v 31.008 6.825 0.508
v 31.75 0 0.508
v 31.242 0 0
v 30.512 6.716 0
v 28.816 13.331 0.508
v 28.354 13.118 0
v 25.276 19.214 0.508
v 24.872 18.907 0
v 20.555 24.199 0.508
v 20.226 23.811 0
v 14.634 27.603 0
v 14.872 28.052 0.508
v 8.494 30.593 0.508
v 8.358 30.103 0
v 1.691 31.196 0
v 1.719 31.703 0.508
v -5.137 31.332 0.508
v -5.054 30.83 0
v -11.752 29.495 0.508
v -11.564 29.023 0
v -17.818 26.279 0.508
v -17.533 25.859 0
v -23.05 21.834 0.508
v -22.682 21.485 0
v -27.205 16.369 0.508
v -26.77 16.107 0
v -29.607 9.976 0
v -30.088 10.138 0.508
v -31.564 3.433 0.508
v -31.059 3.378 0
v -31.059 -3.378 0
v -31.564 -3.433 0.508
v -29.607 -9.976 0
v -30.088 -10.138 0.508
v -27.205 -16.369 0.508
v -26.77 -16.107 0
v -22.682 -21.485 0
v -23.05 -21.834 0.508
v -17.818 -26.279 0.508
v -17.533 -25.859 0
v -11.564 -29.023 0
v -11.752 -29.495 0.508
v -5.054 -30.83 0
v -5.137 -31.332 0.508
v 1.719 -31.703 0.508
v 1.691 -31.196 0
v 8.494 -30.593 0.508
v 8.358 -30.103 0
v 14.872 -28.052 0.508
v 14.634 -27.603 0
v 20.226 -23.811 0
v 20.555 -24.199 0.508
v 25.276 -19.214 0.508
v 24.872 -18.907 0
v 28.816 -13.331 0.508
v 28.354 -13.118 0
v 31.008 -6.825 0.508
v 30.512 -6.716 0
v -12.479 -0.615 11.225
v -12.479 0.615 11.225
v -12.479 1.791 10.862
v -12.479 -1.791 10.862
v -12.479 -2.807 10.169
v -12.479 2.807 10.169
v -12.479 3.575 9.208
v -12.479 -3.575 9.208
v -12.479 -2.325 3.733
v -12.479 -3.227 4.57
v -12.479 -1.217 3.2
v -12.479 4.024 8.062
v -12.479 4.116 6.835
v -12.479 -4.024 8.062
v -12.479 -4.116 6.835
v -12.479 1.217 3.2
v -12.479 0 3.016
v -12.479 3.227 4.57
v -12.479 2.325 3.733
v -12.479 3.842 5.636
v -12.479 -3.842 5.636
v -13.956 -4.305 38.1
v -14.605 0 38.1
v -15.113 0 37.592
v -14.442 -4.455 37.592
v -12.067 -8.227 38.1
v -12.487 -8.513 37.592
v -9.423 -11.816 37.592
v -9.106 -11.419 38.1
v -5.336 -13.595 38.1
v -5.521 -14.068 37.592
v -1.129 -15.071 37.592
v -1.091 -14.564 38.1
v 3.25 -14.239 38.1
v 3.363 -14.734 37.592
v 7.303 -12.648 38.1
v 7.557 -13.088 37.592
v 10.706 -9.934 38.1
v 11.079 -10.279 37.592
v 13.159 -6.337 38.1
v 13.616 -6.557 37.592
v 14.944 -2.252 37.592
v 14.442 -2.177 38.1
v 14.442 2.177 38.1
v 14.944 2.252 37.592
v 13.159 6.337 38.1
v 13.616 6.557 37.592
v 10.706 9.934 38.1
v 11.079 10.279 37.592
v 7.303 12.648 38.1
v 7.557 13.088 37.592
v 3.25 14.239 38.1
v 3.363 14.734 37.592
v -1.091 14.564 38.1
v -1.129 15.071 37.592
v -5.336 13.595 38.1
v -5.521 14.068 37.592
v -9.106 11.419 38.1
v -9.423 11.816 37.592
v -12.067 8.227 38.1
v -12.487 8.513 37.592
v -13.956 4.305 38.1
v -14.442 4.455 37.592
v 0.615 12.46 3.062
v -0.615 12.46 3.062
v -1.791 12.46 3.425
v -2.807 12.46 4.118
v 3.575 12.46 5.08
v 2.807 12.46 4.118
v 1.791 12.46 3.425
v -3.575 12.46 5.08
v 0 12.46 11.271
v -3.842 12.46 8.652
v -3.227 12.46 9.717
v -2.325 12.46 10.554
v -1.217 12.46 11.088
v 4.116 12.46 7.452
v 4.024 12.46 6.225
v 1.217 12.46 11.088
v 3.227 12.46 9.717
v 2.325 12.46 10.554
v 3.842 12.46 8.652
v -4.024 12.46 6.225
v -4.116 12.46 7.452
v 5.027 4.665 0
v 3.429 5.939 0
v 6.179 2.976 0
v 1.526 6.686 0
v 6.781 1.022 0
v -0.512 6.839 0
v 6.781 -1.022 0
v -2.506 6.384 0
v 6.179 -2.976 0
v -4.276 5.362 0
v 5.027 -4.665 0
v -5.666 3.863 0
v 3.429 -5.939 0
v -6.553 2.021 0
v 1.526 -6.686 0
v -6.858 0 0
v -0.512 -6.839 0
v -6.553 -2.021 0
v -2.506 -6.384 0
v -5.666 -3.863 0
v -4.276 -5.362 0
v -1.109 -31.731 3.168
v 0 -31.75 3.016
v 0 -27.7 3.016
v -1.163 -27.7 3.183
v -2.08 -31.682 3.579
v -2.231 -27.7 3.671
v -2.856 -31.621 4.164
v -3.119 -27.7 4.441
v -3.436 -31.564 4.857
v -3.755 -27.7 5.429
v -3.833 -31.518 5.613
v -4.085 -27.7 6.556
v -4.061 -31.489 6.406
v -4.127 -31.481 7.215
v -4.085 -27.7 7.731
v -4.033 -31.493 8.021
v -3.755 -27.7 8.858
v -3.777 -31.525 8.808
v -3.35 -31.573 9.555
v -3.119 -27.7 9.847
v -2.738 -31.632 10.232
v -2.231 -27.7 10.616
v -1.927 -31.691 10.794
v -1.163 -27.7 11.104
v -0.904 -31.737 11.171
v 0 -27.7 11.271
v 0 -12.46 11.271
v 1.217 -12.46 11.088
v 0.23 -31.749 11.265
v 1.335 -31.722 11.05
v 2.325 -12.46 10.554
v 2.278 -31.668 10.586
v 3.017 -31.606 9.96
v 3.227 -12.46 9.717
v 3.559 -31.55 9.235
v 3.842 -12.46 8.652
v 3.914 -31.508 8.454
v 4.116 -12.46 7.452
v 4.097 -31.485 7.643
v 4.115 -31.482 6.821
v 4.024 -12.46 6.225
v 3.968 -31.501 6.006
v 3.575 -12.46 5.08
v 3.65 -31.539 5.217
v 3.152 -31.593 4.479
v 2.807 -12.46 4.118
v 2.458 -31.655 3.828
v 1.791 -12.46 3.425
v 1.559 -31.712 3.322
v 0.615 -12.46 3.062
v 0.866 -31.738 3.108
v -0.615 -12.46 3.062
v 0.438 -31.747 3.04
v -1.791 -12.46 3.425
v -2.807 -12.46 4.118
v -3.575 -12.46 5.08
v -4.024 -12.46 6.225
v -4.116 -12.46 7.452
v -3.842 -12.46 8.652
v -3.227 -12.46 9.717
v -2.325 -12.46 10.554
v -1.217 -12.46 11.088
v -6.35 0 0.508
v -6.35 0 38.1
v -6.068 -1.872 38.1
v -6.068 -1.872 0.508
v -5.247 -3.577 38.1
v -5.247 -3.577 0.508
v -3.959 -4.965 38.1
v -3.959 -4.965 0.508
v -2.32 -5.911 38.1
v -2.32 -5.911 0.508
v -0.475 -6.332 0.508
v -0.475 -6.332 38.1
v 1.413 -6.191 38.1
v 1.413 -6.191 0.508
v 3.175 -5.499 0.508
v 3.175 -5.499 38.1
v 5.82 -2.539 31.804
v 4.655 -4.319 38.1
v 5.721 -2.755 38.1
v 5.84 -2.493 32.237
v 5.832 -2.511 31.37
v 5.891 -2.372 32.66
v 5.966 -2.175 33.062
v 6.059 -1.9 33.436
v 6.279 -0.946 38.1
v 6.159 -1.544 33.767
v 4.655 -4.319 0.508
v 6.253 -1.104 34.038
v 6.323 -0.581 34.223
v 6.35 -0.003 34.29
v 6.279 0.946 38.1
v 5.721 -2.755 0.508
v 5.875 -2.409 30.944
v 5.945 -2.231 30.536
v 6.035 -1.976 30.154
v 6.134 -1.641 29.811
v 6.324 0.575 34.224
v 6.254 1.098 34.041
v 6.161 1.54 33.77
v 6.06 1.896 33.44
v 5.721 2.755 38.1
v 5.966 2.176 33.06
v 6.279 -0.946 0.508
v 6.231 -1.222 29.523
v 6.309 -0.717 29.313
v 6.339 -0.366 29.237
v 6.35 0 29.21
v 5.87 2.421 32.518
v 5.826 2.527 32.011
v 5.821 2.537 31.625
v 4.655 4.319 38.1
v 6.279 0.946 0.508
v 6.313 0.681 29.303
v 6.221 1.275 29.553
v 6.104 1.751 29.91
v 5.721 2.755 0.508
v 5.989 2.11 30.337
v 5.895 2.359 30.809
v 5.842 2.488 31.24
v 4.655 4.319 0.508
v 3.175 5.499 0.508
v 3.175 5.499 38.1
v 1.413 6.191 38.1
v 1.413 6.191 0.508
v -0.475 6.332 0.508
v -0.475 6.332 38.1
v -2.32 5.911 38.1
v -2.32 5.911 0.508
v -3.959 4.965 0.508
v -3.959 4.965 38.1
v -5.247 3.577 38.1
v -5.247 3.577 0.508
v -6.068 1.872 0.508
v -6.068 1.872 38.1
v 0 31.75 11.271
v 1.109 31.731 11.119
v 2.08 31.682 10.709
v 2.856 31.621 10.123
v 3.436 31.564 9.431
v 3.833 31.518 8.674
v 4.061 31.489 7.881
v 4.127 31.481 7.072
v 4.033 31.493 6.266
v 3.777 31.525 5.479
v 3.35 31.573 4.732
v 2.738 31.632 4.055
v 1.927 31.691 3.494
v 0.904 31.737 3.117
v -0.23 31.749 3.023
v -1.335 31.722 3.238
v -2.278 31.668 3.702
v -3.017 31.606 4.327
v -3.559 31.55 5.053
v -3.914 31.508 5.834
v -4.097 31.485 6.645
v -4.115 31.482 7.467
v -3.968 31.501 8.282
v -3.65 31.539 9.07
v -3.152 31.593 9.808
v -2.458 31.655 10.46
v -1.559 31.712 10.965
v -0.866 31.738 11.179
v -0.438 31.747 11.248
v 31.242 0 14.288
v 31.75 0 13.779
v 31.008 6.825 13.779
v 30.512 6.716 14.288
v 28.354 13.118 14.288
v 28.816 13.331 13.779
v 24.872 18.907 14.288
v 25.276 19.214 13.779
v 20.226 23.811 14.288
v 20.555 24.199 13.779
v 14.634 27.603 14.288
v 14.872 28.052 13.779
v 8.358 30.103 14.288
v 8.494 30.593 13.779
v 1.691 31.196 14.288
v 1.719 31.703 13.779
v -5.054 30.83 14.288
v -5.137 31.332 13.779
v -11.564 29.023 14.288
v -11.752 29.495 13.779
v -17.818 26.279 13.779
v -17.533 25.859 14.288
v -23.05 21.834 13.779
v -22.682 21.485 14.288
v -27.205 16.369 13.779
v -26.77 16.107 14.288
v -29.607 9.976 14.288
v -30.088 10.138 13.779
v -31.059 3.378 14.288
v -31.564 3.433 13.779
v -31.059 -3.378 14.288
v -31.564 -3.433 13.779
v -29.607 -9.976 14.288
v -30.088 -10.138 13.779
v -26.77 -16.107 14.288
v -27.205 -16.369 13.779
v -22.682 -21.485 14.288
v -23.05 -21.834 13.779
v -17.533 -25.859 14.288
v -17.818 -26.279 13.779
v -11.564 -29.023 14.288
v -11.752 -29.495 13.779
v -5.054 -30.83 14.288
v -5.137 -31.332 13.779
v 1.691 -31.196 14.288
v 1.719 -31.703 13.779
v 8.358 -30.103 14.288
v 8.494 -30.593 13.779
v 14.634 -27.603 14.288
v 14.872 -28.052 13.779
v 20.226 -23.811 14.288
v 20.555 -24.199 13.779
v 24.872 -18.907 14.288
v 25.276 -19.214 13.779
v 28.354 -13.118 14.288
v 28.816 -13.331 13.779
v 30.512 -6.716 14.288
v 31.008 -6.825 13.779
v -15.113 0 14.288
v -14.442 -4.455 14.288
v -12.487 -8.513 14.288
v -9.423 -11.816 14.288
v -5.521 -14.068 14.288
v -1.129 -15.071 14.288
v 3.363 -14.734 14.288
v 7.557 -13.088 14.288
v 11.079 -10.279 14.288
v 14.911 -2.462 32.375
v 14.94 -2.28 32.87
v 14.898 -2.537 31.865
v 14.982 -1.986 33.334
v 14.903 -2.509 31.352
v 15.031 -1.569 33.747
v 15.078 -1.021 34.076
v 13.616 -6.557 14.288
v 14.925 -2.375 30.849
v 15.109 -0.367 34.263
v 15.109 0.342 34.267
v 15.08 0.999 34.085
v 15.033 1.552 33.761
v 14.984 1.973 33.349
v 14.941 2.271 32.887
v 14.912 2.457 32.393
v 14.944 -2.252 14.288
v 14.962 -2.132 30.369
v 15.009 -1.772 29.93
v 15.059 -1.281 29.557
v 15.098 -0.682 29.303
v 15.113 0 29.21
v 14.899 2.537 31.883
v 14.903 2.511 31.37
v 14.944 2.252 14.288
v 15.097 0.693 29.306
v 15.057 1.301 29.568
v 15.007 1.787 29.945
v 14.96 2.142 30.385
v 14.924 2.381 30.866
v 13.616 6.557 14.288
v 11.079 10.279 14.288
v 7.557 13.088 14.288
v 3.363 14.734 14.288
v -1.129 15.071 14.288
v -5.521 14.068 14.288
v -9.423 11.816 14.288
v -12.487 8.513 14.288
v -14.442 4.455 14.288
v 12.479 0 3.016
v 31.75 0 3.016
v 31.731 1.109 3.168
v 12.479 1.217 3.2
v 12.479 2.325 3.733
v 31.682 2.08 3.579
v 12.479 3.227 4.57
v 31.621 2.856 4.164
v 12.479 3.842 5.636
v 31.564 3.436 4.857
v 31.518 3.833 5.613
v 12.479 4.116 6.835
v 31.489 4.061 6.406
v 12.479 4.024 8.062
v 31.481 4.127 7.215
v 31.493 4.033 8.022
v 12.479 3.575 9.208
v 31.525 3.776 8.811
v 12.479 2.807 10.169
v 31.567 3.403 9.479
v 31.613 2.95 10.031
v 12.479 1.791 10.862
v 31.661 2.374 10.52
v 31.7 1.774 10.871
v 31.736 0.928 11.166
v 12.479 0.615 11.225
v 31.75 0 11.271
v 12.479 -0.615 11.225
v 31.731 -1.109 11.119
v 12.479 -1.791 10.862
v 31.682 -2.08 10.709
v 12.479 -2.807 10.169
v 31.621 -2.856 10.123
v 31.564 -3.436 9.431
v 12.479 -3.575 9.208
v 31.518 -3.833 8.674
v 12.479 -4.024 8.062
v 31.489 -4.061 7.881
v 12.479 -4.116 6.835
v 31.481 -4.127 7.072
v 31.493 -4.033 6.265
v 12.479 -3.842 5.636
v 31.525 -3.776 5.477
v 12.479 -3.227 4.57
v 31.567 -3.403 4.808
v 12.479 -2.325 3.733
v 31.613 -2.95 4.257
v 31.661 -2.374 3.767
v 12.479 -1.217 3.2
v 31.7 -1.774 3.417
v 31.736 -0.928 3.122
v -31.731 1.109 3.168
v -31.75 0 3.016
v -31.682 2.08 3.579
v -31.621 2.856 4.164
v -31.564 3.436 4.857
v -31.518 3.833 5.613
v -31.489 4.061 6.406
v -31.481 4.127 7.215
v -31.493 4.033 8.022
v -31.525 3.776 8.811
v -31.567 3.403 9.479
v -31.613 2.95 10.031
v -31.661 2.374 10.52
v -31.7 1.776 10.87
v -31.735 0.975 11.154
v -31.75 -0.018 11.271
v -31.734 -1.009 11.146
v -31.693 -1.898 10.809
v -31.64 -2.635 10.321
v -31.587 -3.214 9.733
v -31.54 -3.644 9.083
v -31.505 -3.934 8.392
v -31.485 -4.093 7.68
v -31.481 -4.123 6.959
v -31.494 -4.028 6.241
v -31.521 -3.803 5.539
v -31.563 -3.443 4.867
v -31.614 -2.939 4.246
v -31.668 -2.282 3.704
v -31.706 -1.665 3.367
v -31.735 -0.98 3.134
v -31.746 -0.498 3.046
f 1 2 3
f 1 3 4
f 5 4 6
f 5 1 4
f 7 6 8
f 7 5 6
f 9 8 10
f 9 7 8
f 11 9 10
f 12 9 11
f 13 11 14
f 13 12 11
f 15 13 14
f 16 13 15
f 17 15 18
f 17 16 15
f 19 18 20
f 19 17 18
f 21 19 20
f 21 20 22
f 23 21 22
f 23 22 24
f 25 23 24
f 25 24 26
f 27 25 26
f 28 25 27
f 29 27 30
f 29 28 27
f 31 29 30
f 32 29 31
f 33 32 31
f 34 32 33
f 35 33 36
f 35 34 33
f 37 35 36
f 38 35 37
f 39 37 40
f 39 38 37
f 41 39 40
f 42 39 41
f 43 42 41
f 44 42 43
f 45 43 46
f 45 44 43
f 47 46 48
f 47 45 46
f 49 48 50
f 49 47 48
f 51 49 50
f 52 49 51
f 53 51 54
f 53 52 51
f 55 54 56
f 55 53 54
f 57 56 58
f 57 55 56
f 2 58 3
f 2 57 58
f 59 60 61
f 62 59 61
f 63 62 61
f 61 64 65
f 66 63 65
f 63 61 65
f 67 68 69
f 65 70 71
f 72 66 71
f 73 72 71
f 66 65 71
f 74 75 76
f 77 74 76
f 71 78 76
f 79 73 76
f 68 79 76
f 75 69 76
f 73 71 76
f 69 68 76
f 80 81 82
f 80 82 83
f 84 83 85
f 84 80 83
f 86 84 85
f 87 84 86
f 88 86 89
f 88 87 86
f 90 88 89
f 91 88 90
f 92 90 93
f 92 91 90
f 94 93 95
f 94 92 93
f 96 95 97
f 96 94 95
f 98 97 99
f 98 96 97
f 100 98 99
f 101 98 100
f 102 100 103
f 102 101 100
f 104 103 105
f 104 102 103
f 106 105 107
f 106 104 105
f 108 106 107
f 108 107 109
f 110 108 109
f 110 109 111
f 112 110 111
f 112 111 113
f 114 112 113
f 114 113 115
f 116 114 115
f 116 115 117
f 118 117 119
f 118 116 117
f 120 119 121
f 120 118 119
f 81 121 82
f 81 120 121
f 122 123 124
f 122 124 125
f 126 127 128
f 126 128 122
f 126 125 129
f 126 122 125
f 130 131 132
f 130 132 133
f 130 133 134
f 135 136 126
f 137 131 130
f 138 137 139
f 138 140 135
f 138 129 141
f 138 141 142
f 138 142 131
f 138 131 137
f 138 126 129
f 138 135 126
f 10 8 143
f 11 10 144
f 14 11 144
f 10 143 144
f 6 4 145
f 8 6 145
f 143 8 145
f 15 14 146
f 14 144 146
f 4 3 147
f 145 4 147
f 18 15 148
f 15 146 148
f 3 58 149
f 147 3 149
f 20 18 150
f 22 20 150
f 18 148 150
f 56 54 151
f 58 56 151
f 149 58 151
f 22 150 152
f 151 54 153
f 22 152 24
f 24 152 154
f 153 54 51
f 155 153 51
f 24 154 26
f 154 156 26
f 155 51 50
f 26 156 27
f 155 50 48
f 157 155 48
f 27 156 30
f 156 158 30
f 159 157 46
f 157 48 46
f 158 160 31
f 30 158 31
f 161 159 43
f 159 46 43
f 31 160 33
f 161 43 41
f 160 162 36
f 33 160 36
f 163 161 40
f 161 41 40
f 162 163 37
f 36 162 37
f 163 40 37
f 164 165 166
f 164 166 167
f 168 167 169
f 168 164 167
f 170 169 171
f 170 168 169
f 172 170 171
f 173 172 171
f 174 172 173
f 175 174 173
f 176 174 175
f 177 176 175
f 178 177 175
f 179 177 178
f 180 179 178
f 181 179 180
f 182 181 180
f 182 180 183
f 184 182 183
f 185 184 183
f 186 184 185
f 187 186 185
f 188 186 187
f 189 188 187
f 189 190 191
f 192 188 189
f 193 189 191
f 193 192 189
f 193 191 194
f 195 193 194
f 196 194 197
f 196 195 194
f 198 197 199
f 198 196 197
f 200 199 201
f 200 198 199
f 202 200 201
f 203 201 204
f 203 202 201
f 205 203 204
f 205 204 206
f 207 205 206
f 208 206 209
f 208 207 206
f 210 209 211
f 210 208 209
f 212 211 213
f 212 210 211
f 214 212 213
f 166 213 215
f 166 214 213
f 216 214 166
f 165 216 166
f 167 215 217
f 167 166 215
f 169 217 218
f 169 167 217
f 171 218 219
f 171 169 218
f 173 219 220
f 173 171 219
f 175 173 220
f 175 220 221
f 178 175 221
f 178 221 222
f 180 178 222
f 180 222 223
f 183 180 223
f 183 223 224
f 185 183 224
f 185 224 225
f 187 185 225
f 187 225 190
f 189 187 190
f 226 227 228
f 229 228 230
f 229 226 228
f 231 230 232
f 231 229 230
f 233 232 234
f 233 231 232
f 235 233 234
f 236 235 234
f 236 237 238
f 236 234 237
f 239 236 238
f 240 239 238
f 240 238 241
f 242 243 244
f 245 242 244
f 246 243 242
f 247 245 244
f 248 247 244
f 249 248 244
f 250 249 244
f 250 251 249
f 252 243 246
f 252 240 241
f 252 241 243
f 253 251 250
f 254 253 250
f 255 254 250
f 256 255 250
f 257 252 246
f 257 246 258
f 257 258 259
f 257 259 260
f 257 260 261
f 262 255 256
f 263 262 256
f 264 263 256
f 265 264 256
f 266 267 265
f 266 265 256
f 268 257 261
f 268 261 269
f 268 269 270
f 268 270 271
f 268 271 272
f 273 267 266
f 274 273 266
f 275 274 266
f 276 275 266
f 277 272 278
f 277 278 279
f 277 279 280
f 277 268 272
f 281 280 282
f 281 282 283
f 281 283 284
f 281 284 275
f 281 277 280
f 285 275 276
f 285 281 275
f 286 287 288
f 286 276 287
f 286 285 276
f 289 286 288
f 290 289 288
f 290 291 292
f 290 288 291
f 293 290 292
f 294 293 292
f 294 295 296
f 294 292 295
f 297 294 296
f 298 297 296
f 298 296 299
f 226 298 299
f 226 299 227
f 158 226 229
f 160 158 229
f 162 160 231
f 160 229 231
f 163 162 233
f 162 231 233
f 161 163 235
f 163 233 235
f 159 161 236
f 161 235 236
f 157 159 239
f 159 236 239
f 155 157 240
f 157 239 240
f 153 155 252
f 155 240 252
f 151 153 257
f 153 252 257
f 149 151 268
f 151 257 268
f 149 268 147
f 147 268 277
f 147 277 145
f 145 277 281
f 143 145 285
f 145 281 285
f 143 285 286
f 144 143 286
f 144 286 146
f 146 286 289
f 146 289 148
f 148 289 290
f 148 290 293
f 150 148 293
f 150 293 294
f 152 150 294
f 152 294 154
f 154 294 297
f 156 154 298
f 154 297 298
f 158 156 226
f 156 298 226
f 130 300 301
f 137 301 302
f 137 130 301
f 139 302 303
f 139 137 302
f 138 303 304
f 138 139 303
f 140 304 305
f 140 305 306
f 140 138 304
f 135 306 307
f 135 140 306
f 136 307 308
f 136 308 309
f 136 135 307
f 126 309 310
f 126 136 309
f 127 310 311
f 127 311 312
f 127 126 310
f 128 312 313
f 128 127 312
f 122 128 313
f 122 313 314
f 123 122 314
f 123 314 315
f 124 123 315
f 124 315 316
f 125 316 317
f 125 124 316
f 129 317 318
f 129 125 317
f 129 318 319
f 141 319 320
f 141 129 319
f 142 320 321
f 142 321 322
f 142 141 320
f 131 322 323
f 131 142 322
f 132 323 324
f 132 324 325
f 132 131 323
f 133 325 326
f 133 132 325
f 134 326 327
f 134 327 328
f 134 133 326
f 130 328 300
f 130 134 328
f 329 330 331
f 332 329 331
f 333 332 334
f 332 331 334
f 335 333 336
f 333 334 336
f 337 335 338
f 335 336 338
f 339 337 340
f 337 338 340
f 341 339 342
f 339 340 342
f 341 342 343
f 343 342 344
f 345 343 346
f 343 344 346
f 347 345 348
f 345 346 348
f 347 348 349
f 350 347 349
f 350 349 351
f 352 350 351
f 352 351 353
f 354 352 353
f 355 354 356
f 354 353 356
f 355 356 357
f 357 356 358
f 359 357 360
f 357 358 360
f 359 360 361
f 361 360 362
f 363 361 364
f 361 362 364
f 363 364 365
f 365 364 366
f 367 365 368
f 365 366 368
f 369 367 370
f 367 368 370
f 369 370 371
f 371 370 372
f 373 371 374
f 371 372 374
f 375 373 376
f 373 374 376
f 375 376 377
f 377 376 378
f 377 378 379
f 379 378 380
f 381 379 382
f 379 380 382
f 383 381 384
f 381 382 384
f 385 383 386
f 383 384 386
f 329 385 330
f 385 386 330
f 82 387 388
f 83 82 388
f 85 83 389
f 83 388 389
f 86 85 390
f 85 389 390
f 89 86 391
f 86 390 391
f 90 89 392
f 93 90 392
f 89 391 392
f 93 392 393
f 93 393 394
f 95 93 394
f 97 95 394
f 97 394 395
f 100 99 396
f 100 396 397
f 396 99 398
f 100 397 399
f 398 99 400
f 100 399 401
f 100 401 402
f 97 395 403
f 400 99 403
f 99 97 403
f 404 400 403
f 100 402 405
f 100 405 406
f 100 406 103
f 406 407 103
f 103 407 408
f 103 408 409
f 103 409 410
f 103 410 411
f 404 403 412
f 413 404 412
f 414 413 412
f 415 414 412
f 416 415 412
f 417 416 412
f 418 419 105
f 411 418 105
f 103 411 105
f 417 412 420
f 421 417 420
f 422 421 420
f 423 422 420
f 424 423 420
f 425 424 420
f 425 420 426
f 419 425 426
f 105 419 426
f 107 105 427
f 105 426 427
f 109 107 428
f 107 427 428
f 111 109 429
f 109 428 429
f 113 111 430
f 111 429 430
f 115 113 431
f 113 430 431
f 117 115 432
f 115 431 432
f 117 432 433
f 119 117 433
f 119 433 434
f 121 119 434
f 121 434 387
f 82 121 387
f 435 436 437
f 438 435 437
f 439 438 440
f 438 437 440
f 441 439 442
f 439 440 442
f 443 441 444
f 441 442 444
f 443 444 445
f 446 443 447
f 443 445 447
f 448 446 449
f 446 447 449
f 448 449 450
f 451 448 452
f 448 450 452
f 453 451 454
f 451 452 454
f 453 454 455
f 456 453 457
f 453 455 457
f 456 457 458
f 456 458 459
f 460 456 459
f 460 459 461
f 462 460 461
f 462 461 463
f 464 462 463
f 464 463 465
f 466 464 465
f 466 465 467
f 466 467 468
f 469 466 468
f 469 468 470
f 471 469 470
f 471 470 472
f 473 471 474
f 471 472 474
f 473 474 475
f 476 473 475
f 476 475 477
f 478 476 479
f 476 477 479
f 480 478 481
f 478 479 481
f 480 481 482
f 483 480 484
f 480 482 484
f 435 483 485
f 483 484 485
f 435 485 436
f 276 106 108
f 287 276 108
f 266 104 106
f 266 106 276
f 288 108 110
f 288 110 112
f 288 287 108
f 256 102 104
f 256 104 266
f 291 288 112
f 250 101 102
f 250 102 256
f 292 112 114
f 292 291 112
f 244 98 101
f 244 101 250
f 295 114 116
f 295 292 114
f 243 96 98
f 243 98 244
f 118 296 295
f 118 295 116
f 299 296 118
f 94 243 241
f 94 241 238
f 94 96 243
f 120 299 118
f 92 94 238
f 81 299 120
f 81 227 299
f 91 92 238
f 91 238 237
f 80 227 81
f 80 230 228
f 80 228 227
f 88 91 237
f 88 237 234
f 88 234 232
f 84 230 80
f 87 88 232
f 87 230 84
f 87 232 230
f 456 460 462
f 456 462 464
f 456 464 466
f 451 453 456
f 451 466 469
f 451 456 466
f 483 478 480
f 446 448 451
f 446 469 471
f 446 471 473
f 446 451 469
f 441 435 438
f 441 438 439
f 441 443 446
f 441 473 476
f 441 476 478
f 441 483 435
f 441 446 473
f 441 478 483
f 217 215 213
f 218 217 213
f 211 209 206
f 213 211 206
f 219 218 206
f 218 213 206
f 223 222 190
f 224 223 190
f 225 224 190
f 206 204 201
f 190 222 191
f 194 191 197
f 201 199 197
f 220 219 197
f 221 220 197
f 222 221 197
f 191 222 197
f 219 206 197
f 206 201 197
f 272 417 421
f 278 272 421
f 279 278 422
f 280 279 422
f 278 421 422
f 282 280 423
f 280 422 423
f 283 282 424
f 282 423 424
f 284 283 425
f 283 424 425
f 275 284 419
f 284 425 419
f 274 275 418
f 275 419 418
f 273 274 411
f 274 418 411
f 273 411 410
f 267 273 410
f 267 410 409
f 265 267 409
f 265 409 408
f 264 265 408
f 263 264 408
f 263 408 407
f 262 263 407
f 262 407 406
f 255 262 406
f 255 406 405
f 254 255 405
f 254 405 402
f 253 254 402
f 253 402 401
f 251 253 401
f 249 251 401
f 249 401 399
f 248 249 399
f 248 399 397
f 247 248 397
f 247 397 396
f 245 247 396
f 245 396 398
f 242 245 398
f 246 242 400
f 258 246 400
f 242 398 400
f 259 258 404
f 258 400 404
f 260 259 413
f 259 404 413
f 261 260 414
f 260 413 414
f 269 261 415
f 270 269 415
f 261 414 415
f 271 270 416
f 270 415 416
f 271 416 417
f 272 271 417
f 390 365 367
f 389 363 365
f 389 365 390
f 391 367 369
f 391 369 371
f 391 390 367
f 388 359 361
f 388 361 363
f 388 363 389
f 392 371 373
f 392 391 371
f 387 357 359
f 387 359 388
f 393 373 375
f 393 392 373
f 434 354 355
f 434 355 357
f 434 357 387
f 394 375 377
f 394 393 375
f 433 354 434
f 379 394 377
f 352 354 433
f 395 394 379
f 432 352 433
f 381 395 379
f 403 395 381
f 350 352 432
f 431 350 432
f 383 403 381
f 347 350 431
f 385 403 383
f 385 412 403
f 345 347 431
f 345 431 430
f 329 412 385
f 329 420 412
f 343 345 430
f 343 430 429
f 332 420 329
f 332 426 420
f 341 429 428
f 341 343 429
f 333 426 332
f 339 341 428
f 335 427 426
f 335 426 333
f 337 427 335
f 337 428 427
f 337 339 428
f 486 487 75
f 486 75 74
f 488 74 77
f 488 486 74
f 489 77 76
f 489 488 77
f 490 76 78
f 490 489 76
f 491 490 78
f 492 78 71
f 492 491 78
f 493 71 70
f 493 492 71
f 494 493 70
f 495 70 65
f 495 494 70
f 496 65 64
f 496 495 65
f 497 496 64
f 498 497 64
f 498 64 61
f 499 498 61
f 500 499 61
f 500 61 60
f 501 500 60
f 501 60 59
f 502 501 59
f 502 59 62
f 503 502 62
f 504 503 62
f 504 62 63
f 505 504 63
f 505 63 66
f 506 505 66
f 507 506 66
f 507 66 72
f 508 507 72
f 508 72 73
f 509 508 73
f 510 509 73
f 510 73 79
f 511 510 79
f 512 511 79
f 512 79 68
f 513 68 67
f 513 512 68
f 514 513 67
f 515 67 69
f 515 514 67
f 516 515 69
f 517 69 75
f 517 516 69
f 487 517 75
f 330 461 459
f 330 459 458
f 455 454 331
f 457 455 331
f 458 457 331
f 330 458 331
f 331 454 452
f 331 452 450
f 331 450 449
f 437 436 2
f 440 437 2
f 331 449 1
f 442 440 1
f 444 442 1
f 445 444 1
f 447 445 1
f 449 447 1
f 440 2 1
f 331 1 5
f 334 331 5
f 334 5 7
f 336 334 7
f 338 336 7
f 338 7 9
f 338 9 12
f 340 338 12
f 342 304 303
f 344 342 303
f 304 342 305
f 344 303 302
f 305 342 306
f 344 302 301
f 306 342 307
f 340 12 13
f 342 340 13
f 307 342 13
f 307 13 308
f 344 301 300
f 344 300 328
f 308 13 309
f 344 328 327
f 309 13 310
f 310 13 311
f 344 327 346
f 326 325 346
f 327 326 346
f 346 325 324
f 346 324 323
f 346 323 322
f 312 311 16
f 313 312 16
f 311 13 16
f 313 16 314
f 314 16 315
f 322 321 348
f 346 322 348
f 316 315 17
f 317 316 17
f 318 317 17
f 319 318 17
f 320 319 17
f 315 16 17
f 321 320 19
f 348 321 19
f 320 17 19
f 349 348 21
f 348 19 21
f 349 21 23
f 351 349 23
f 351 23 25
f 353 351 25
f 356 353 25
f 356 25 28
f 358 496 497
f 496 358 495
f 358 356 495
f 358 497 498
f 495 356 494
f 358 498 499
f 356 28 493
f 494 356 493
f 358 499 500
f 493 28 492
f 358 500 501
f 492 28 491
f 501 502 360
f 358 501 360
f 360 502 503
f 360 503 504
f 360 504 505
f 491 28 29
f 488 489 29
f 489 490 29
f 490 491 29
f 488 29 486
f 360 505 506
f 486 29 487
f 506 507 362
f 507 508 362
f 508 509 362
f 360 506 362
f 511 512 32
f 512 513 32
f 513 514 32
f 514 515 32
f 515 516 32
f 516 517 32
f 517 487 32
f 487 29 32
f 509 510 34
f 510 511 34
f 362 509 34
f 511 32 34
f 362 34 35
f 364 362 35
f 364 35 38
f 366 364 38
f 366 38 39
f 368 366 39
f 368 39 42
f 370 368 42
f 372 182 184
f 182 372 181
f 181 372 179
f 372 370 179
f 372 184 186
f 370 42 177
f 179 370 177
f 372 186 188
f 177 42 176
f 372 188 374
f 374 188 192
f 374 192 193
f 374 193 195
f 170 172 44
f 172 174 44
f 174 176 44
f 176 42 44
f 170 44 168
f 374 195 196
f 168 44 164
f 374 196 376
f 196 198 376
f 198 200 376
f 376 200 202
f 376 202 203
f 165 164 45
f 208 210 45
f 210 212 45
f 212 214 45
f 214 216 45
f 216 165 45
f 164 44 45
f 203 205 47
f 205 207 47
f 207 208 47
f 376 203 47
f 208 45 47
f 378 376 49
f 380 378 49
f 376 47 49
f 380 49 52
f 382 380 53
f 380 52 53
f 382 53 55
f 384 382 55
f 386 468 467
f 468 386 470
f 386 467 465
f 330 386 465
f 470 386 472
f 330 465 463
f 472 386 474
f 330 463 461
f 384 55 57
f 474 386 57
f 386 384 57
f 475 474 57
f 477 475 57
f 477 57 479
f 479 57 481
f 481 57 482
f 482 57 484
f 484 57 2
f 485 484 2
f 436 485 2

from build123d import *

# Parameters (mm, degrees)
SKETCH1_R           = 31.75
BASE_EXTRUDE_DEPTH  = 14.2875
SKETCH2_R           = 15.113
BOSS_EXTRUDE1_DEPTH = 38.1
SKETCH3_R           = 6.35
CUT_EXTRUDE1_DEPTH  = 77.724
SKETCH5_R           = 2.54
CUT_EXTRUDE3_DEPTH  = 37.846
SKETCH6_R           = 4.1275
CUT_EXTRUDE4_DEPTH  = 25.8572
SKETCH7_R           = 4.1275
CUT_EXTRUDE5_DEPTH  = 15.24
SKETCH8_R           = 4.1275
CUT_EXTRUDE6_DEPTH  = 26.51
SKETCH9_R           = 4.1275
CUT_EXTRUDE7_DEPTH  = 10.508
CHAMFER1_SIZE       = 0.508


with BuildPart() as part:
    # Sketch1 → Base-Extrude (new body)
    with BuildSketch(Plane.XY):
        Circle(SKETCH1_R)
    extrude(amount=BASE_EXTRUDE_DEPTH)

    # Sketch2 → Boss-Extrude1 (add)
    with BuildSketch(Plane.XY):
        with Locations(Location((0, 0, 0), (0, 0, 180))):
            Circle(SKETCH2_R)
    extrude(amount=BOSS_EXTRUDE1_DEPTH)

    # Sketch3 → Cut-Extrude1 (cut)
    with BuildSketch(Plane.XY):
        with Locations(Location((0, 0, 0), (0, 0, 180))):
            Circle(SKETCH3_R)
    extrude(amount=CUT_EXTRUDE1_DEPTH, mode=Mode.SUBTRACT)

    # Sketch5 → Cut-Extrude3 (cut)
    with BuildSketch(Plane(origin=(38.336621827, 0, 0), x_dir=(0, 0, -1), z_dir=(1, 0, 0))):
        with Locations((-31.75, 0)):
            Circle(SKETCH5_R)
    extrude(amount=-CUT_EXTRUDE3_DEPTH, mode=Mode.SUBTRACT)

    # Sketch6 → Cut-Extrude4 (cut)
    with BuildSketch(Plane(origin=(38.336621827, 0, 0), x_dir=(0, 0, -1), z_dir=(1, 0, 0))):
        with Locations((-7.14375, 0)):
            Circle(SKETCH6_R)
    cut_extrude4 = extrude(amount=-CUT_EXTRUDE4_DEPTH, mode=Mode.SUBTRACT)

    # Sketch7 → Cut-Extrude5 (cut)
    with BuildSketch(Plane(origin=(0, 27.700210809, 0), x_dir=(-1, 0, 0), z_dir=(0, 1, 0))):
        with Locations(Location((0, 7.14375, 0), (0, 0, 90))):
            Circle(SKETCH7_R)
    cut_extrude5 = extrude(amount=-CUT_EXTRUDE5_DEPTH, mode=Mode.SUBTRACT)

    # Mirror1: Cut-Extrude4 across plane
    add(cut_extrude4.mirror(Plane(origin=(0, 0, 0), x_dir=(0, 0, 1), z_dir=(1, 0, 0))), mode=Mode.SUBTRACT)

    # Mirror2: Cut-Extrude5 across plane
    add(cut_extrude5.mirror(Plane.ZX), mode=Mode.SUBTRACT)

    # Sketch8 → Cut-Extrude6 (cut)
    with BuildSketch(Plane(origin=(0, 27.700210809, 0), x_dir=(-1, 0, 0), z_dir=(0, 1, 0))):
        with Locations(Location((0, 7.14375, 0), (0, 0, 90))):
            Circle(SKETCH8_R)
    extrude(amount=CUT_EXTRUDE6_DEPTH, mode=Mode.SUBTRACT)

    # Sketch9 → Cut-Extrude7 (cut)
    with BuildSketch(Plane(origin=(0, -34.128089617, 0), x_dir=(-1, 0, 0), z_dir=(0, 1, 0))):
        with Locations(Location((0, 7.14375, 0), (0, 0, 270))):
            Circle(SKETCH9_R)
    extrude(amount=CUT_EXTRUDE7_DEPTH, mode=Mode.SUBTRACT)

    # Chamfer1
    chamfer1_edges = [part.edges().sort_by_distance(p)[0] for p in [
        (6.35, 0, 0),
        (-31.75, 0, 0),
        (-31.75, 0, 14.2875),
        (15.113, 0, 38.1),
    ]]
    chamfer(chamfer1_edges, length=CHAMFER1_SIZE)


solid = part.part
